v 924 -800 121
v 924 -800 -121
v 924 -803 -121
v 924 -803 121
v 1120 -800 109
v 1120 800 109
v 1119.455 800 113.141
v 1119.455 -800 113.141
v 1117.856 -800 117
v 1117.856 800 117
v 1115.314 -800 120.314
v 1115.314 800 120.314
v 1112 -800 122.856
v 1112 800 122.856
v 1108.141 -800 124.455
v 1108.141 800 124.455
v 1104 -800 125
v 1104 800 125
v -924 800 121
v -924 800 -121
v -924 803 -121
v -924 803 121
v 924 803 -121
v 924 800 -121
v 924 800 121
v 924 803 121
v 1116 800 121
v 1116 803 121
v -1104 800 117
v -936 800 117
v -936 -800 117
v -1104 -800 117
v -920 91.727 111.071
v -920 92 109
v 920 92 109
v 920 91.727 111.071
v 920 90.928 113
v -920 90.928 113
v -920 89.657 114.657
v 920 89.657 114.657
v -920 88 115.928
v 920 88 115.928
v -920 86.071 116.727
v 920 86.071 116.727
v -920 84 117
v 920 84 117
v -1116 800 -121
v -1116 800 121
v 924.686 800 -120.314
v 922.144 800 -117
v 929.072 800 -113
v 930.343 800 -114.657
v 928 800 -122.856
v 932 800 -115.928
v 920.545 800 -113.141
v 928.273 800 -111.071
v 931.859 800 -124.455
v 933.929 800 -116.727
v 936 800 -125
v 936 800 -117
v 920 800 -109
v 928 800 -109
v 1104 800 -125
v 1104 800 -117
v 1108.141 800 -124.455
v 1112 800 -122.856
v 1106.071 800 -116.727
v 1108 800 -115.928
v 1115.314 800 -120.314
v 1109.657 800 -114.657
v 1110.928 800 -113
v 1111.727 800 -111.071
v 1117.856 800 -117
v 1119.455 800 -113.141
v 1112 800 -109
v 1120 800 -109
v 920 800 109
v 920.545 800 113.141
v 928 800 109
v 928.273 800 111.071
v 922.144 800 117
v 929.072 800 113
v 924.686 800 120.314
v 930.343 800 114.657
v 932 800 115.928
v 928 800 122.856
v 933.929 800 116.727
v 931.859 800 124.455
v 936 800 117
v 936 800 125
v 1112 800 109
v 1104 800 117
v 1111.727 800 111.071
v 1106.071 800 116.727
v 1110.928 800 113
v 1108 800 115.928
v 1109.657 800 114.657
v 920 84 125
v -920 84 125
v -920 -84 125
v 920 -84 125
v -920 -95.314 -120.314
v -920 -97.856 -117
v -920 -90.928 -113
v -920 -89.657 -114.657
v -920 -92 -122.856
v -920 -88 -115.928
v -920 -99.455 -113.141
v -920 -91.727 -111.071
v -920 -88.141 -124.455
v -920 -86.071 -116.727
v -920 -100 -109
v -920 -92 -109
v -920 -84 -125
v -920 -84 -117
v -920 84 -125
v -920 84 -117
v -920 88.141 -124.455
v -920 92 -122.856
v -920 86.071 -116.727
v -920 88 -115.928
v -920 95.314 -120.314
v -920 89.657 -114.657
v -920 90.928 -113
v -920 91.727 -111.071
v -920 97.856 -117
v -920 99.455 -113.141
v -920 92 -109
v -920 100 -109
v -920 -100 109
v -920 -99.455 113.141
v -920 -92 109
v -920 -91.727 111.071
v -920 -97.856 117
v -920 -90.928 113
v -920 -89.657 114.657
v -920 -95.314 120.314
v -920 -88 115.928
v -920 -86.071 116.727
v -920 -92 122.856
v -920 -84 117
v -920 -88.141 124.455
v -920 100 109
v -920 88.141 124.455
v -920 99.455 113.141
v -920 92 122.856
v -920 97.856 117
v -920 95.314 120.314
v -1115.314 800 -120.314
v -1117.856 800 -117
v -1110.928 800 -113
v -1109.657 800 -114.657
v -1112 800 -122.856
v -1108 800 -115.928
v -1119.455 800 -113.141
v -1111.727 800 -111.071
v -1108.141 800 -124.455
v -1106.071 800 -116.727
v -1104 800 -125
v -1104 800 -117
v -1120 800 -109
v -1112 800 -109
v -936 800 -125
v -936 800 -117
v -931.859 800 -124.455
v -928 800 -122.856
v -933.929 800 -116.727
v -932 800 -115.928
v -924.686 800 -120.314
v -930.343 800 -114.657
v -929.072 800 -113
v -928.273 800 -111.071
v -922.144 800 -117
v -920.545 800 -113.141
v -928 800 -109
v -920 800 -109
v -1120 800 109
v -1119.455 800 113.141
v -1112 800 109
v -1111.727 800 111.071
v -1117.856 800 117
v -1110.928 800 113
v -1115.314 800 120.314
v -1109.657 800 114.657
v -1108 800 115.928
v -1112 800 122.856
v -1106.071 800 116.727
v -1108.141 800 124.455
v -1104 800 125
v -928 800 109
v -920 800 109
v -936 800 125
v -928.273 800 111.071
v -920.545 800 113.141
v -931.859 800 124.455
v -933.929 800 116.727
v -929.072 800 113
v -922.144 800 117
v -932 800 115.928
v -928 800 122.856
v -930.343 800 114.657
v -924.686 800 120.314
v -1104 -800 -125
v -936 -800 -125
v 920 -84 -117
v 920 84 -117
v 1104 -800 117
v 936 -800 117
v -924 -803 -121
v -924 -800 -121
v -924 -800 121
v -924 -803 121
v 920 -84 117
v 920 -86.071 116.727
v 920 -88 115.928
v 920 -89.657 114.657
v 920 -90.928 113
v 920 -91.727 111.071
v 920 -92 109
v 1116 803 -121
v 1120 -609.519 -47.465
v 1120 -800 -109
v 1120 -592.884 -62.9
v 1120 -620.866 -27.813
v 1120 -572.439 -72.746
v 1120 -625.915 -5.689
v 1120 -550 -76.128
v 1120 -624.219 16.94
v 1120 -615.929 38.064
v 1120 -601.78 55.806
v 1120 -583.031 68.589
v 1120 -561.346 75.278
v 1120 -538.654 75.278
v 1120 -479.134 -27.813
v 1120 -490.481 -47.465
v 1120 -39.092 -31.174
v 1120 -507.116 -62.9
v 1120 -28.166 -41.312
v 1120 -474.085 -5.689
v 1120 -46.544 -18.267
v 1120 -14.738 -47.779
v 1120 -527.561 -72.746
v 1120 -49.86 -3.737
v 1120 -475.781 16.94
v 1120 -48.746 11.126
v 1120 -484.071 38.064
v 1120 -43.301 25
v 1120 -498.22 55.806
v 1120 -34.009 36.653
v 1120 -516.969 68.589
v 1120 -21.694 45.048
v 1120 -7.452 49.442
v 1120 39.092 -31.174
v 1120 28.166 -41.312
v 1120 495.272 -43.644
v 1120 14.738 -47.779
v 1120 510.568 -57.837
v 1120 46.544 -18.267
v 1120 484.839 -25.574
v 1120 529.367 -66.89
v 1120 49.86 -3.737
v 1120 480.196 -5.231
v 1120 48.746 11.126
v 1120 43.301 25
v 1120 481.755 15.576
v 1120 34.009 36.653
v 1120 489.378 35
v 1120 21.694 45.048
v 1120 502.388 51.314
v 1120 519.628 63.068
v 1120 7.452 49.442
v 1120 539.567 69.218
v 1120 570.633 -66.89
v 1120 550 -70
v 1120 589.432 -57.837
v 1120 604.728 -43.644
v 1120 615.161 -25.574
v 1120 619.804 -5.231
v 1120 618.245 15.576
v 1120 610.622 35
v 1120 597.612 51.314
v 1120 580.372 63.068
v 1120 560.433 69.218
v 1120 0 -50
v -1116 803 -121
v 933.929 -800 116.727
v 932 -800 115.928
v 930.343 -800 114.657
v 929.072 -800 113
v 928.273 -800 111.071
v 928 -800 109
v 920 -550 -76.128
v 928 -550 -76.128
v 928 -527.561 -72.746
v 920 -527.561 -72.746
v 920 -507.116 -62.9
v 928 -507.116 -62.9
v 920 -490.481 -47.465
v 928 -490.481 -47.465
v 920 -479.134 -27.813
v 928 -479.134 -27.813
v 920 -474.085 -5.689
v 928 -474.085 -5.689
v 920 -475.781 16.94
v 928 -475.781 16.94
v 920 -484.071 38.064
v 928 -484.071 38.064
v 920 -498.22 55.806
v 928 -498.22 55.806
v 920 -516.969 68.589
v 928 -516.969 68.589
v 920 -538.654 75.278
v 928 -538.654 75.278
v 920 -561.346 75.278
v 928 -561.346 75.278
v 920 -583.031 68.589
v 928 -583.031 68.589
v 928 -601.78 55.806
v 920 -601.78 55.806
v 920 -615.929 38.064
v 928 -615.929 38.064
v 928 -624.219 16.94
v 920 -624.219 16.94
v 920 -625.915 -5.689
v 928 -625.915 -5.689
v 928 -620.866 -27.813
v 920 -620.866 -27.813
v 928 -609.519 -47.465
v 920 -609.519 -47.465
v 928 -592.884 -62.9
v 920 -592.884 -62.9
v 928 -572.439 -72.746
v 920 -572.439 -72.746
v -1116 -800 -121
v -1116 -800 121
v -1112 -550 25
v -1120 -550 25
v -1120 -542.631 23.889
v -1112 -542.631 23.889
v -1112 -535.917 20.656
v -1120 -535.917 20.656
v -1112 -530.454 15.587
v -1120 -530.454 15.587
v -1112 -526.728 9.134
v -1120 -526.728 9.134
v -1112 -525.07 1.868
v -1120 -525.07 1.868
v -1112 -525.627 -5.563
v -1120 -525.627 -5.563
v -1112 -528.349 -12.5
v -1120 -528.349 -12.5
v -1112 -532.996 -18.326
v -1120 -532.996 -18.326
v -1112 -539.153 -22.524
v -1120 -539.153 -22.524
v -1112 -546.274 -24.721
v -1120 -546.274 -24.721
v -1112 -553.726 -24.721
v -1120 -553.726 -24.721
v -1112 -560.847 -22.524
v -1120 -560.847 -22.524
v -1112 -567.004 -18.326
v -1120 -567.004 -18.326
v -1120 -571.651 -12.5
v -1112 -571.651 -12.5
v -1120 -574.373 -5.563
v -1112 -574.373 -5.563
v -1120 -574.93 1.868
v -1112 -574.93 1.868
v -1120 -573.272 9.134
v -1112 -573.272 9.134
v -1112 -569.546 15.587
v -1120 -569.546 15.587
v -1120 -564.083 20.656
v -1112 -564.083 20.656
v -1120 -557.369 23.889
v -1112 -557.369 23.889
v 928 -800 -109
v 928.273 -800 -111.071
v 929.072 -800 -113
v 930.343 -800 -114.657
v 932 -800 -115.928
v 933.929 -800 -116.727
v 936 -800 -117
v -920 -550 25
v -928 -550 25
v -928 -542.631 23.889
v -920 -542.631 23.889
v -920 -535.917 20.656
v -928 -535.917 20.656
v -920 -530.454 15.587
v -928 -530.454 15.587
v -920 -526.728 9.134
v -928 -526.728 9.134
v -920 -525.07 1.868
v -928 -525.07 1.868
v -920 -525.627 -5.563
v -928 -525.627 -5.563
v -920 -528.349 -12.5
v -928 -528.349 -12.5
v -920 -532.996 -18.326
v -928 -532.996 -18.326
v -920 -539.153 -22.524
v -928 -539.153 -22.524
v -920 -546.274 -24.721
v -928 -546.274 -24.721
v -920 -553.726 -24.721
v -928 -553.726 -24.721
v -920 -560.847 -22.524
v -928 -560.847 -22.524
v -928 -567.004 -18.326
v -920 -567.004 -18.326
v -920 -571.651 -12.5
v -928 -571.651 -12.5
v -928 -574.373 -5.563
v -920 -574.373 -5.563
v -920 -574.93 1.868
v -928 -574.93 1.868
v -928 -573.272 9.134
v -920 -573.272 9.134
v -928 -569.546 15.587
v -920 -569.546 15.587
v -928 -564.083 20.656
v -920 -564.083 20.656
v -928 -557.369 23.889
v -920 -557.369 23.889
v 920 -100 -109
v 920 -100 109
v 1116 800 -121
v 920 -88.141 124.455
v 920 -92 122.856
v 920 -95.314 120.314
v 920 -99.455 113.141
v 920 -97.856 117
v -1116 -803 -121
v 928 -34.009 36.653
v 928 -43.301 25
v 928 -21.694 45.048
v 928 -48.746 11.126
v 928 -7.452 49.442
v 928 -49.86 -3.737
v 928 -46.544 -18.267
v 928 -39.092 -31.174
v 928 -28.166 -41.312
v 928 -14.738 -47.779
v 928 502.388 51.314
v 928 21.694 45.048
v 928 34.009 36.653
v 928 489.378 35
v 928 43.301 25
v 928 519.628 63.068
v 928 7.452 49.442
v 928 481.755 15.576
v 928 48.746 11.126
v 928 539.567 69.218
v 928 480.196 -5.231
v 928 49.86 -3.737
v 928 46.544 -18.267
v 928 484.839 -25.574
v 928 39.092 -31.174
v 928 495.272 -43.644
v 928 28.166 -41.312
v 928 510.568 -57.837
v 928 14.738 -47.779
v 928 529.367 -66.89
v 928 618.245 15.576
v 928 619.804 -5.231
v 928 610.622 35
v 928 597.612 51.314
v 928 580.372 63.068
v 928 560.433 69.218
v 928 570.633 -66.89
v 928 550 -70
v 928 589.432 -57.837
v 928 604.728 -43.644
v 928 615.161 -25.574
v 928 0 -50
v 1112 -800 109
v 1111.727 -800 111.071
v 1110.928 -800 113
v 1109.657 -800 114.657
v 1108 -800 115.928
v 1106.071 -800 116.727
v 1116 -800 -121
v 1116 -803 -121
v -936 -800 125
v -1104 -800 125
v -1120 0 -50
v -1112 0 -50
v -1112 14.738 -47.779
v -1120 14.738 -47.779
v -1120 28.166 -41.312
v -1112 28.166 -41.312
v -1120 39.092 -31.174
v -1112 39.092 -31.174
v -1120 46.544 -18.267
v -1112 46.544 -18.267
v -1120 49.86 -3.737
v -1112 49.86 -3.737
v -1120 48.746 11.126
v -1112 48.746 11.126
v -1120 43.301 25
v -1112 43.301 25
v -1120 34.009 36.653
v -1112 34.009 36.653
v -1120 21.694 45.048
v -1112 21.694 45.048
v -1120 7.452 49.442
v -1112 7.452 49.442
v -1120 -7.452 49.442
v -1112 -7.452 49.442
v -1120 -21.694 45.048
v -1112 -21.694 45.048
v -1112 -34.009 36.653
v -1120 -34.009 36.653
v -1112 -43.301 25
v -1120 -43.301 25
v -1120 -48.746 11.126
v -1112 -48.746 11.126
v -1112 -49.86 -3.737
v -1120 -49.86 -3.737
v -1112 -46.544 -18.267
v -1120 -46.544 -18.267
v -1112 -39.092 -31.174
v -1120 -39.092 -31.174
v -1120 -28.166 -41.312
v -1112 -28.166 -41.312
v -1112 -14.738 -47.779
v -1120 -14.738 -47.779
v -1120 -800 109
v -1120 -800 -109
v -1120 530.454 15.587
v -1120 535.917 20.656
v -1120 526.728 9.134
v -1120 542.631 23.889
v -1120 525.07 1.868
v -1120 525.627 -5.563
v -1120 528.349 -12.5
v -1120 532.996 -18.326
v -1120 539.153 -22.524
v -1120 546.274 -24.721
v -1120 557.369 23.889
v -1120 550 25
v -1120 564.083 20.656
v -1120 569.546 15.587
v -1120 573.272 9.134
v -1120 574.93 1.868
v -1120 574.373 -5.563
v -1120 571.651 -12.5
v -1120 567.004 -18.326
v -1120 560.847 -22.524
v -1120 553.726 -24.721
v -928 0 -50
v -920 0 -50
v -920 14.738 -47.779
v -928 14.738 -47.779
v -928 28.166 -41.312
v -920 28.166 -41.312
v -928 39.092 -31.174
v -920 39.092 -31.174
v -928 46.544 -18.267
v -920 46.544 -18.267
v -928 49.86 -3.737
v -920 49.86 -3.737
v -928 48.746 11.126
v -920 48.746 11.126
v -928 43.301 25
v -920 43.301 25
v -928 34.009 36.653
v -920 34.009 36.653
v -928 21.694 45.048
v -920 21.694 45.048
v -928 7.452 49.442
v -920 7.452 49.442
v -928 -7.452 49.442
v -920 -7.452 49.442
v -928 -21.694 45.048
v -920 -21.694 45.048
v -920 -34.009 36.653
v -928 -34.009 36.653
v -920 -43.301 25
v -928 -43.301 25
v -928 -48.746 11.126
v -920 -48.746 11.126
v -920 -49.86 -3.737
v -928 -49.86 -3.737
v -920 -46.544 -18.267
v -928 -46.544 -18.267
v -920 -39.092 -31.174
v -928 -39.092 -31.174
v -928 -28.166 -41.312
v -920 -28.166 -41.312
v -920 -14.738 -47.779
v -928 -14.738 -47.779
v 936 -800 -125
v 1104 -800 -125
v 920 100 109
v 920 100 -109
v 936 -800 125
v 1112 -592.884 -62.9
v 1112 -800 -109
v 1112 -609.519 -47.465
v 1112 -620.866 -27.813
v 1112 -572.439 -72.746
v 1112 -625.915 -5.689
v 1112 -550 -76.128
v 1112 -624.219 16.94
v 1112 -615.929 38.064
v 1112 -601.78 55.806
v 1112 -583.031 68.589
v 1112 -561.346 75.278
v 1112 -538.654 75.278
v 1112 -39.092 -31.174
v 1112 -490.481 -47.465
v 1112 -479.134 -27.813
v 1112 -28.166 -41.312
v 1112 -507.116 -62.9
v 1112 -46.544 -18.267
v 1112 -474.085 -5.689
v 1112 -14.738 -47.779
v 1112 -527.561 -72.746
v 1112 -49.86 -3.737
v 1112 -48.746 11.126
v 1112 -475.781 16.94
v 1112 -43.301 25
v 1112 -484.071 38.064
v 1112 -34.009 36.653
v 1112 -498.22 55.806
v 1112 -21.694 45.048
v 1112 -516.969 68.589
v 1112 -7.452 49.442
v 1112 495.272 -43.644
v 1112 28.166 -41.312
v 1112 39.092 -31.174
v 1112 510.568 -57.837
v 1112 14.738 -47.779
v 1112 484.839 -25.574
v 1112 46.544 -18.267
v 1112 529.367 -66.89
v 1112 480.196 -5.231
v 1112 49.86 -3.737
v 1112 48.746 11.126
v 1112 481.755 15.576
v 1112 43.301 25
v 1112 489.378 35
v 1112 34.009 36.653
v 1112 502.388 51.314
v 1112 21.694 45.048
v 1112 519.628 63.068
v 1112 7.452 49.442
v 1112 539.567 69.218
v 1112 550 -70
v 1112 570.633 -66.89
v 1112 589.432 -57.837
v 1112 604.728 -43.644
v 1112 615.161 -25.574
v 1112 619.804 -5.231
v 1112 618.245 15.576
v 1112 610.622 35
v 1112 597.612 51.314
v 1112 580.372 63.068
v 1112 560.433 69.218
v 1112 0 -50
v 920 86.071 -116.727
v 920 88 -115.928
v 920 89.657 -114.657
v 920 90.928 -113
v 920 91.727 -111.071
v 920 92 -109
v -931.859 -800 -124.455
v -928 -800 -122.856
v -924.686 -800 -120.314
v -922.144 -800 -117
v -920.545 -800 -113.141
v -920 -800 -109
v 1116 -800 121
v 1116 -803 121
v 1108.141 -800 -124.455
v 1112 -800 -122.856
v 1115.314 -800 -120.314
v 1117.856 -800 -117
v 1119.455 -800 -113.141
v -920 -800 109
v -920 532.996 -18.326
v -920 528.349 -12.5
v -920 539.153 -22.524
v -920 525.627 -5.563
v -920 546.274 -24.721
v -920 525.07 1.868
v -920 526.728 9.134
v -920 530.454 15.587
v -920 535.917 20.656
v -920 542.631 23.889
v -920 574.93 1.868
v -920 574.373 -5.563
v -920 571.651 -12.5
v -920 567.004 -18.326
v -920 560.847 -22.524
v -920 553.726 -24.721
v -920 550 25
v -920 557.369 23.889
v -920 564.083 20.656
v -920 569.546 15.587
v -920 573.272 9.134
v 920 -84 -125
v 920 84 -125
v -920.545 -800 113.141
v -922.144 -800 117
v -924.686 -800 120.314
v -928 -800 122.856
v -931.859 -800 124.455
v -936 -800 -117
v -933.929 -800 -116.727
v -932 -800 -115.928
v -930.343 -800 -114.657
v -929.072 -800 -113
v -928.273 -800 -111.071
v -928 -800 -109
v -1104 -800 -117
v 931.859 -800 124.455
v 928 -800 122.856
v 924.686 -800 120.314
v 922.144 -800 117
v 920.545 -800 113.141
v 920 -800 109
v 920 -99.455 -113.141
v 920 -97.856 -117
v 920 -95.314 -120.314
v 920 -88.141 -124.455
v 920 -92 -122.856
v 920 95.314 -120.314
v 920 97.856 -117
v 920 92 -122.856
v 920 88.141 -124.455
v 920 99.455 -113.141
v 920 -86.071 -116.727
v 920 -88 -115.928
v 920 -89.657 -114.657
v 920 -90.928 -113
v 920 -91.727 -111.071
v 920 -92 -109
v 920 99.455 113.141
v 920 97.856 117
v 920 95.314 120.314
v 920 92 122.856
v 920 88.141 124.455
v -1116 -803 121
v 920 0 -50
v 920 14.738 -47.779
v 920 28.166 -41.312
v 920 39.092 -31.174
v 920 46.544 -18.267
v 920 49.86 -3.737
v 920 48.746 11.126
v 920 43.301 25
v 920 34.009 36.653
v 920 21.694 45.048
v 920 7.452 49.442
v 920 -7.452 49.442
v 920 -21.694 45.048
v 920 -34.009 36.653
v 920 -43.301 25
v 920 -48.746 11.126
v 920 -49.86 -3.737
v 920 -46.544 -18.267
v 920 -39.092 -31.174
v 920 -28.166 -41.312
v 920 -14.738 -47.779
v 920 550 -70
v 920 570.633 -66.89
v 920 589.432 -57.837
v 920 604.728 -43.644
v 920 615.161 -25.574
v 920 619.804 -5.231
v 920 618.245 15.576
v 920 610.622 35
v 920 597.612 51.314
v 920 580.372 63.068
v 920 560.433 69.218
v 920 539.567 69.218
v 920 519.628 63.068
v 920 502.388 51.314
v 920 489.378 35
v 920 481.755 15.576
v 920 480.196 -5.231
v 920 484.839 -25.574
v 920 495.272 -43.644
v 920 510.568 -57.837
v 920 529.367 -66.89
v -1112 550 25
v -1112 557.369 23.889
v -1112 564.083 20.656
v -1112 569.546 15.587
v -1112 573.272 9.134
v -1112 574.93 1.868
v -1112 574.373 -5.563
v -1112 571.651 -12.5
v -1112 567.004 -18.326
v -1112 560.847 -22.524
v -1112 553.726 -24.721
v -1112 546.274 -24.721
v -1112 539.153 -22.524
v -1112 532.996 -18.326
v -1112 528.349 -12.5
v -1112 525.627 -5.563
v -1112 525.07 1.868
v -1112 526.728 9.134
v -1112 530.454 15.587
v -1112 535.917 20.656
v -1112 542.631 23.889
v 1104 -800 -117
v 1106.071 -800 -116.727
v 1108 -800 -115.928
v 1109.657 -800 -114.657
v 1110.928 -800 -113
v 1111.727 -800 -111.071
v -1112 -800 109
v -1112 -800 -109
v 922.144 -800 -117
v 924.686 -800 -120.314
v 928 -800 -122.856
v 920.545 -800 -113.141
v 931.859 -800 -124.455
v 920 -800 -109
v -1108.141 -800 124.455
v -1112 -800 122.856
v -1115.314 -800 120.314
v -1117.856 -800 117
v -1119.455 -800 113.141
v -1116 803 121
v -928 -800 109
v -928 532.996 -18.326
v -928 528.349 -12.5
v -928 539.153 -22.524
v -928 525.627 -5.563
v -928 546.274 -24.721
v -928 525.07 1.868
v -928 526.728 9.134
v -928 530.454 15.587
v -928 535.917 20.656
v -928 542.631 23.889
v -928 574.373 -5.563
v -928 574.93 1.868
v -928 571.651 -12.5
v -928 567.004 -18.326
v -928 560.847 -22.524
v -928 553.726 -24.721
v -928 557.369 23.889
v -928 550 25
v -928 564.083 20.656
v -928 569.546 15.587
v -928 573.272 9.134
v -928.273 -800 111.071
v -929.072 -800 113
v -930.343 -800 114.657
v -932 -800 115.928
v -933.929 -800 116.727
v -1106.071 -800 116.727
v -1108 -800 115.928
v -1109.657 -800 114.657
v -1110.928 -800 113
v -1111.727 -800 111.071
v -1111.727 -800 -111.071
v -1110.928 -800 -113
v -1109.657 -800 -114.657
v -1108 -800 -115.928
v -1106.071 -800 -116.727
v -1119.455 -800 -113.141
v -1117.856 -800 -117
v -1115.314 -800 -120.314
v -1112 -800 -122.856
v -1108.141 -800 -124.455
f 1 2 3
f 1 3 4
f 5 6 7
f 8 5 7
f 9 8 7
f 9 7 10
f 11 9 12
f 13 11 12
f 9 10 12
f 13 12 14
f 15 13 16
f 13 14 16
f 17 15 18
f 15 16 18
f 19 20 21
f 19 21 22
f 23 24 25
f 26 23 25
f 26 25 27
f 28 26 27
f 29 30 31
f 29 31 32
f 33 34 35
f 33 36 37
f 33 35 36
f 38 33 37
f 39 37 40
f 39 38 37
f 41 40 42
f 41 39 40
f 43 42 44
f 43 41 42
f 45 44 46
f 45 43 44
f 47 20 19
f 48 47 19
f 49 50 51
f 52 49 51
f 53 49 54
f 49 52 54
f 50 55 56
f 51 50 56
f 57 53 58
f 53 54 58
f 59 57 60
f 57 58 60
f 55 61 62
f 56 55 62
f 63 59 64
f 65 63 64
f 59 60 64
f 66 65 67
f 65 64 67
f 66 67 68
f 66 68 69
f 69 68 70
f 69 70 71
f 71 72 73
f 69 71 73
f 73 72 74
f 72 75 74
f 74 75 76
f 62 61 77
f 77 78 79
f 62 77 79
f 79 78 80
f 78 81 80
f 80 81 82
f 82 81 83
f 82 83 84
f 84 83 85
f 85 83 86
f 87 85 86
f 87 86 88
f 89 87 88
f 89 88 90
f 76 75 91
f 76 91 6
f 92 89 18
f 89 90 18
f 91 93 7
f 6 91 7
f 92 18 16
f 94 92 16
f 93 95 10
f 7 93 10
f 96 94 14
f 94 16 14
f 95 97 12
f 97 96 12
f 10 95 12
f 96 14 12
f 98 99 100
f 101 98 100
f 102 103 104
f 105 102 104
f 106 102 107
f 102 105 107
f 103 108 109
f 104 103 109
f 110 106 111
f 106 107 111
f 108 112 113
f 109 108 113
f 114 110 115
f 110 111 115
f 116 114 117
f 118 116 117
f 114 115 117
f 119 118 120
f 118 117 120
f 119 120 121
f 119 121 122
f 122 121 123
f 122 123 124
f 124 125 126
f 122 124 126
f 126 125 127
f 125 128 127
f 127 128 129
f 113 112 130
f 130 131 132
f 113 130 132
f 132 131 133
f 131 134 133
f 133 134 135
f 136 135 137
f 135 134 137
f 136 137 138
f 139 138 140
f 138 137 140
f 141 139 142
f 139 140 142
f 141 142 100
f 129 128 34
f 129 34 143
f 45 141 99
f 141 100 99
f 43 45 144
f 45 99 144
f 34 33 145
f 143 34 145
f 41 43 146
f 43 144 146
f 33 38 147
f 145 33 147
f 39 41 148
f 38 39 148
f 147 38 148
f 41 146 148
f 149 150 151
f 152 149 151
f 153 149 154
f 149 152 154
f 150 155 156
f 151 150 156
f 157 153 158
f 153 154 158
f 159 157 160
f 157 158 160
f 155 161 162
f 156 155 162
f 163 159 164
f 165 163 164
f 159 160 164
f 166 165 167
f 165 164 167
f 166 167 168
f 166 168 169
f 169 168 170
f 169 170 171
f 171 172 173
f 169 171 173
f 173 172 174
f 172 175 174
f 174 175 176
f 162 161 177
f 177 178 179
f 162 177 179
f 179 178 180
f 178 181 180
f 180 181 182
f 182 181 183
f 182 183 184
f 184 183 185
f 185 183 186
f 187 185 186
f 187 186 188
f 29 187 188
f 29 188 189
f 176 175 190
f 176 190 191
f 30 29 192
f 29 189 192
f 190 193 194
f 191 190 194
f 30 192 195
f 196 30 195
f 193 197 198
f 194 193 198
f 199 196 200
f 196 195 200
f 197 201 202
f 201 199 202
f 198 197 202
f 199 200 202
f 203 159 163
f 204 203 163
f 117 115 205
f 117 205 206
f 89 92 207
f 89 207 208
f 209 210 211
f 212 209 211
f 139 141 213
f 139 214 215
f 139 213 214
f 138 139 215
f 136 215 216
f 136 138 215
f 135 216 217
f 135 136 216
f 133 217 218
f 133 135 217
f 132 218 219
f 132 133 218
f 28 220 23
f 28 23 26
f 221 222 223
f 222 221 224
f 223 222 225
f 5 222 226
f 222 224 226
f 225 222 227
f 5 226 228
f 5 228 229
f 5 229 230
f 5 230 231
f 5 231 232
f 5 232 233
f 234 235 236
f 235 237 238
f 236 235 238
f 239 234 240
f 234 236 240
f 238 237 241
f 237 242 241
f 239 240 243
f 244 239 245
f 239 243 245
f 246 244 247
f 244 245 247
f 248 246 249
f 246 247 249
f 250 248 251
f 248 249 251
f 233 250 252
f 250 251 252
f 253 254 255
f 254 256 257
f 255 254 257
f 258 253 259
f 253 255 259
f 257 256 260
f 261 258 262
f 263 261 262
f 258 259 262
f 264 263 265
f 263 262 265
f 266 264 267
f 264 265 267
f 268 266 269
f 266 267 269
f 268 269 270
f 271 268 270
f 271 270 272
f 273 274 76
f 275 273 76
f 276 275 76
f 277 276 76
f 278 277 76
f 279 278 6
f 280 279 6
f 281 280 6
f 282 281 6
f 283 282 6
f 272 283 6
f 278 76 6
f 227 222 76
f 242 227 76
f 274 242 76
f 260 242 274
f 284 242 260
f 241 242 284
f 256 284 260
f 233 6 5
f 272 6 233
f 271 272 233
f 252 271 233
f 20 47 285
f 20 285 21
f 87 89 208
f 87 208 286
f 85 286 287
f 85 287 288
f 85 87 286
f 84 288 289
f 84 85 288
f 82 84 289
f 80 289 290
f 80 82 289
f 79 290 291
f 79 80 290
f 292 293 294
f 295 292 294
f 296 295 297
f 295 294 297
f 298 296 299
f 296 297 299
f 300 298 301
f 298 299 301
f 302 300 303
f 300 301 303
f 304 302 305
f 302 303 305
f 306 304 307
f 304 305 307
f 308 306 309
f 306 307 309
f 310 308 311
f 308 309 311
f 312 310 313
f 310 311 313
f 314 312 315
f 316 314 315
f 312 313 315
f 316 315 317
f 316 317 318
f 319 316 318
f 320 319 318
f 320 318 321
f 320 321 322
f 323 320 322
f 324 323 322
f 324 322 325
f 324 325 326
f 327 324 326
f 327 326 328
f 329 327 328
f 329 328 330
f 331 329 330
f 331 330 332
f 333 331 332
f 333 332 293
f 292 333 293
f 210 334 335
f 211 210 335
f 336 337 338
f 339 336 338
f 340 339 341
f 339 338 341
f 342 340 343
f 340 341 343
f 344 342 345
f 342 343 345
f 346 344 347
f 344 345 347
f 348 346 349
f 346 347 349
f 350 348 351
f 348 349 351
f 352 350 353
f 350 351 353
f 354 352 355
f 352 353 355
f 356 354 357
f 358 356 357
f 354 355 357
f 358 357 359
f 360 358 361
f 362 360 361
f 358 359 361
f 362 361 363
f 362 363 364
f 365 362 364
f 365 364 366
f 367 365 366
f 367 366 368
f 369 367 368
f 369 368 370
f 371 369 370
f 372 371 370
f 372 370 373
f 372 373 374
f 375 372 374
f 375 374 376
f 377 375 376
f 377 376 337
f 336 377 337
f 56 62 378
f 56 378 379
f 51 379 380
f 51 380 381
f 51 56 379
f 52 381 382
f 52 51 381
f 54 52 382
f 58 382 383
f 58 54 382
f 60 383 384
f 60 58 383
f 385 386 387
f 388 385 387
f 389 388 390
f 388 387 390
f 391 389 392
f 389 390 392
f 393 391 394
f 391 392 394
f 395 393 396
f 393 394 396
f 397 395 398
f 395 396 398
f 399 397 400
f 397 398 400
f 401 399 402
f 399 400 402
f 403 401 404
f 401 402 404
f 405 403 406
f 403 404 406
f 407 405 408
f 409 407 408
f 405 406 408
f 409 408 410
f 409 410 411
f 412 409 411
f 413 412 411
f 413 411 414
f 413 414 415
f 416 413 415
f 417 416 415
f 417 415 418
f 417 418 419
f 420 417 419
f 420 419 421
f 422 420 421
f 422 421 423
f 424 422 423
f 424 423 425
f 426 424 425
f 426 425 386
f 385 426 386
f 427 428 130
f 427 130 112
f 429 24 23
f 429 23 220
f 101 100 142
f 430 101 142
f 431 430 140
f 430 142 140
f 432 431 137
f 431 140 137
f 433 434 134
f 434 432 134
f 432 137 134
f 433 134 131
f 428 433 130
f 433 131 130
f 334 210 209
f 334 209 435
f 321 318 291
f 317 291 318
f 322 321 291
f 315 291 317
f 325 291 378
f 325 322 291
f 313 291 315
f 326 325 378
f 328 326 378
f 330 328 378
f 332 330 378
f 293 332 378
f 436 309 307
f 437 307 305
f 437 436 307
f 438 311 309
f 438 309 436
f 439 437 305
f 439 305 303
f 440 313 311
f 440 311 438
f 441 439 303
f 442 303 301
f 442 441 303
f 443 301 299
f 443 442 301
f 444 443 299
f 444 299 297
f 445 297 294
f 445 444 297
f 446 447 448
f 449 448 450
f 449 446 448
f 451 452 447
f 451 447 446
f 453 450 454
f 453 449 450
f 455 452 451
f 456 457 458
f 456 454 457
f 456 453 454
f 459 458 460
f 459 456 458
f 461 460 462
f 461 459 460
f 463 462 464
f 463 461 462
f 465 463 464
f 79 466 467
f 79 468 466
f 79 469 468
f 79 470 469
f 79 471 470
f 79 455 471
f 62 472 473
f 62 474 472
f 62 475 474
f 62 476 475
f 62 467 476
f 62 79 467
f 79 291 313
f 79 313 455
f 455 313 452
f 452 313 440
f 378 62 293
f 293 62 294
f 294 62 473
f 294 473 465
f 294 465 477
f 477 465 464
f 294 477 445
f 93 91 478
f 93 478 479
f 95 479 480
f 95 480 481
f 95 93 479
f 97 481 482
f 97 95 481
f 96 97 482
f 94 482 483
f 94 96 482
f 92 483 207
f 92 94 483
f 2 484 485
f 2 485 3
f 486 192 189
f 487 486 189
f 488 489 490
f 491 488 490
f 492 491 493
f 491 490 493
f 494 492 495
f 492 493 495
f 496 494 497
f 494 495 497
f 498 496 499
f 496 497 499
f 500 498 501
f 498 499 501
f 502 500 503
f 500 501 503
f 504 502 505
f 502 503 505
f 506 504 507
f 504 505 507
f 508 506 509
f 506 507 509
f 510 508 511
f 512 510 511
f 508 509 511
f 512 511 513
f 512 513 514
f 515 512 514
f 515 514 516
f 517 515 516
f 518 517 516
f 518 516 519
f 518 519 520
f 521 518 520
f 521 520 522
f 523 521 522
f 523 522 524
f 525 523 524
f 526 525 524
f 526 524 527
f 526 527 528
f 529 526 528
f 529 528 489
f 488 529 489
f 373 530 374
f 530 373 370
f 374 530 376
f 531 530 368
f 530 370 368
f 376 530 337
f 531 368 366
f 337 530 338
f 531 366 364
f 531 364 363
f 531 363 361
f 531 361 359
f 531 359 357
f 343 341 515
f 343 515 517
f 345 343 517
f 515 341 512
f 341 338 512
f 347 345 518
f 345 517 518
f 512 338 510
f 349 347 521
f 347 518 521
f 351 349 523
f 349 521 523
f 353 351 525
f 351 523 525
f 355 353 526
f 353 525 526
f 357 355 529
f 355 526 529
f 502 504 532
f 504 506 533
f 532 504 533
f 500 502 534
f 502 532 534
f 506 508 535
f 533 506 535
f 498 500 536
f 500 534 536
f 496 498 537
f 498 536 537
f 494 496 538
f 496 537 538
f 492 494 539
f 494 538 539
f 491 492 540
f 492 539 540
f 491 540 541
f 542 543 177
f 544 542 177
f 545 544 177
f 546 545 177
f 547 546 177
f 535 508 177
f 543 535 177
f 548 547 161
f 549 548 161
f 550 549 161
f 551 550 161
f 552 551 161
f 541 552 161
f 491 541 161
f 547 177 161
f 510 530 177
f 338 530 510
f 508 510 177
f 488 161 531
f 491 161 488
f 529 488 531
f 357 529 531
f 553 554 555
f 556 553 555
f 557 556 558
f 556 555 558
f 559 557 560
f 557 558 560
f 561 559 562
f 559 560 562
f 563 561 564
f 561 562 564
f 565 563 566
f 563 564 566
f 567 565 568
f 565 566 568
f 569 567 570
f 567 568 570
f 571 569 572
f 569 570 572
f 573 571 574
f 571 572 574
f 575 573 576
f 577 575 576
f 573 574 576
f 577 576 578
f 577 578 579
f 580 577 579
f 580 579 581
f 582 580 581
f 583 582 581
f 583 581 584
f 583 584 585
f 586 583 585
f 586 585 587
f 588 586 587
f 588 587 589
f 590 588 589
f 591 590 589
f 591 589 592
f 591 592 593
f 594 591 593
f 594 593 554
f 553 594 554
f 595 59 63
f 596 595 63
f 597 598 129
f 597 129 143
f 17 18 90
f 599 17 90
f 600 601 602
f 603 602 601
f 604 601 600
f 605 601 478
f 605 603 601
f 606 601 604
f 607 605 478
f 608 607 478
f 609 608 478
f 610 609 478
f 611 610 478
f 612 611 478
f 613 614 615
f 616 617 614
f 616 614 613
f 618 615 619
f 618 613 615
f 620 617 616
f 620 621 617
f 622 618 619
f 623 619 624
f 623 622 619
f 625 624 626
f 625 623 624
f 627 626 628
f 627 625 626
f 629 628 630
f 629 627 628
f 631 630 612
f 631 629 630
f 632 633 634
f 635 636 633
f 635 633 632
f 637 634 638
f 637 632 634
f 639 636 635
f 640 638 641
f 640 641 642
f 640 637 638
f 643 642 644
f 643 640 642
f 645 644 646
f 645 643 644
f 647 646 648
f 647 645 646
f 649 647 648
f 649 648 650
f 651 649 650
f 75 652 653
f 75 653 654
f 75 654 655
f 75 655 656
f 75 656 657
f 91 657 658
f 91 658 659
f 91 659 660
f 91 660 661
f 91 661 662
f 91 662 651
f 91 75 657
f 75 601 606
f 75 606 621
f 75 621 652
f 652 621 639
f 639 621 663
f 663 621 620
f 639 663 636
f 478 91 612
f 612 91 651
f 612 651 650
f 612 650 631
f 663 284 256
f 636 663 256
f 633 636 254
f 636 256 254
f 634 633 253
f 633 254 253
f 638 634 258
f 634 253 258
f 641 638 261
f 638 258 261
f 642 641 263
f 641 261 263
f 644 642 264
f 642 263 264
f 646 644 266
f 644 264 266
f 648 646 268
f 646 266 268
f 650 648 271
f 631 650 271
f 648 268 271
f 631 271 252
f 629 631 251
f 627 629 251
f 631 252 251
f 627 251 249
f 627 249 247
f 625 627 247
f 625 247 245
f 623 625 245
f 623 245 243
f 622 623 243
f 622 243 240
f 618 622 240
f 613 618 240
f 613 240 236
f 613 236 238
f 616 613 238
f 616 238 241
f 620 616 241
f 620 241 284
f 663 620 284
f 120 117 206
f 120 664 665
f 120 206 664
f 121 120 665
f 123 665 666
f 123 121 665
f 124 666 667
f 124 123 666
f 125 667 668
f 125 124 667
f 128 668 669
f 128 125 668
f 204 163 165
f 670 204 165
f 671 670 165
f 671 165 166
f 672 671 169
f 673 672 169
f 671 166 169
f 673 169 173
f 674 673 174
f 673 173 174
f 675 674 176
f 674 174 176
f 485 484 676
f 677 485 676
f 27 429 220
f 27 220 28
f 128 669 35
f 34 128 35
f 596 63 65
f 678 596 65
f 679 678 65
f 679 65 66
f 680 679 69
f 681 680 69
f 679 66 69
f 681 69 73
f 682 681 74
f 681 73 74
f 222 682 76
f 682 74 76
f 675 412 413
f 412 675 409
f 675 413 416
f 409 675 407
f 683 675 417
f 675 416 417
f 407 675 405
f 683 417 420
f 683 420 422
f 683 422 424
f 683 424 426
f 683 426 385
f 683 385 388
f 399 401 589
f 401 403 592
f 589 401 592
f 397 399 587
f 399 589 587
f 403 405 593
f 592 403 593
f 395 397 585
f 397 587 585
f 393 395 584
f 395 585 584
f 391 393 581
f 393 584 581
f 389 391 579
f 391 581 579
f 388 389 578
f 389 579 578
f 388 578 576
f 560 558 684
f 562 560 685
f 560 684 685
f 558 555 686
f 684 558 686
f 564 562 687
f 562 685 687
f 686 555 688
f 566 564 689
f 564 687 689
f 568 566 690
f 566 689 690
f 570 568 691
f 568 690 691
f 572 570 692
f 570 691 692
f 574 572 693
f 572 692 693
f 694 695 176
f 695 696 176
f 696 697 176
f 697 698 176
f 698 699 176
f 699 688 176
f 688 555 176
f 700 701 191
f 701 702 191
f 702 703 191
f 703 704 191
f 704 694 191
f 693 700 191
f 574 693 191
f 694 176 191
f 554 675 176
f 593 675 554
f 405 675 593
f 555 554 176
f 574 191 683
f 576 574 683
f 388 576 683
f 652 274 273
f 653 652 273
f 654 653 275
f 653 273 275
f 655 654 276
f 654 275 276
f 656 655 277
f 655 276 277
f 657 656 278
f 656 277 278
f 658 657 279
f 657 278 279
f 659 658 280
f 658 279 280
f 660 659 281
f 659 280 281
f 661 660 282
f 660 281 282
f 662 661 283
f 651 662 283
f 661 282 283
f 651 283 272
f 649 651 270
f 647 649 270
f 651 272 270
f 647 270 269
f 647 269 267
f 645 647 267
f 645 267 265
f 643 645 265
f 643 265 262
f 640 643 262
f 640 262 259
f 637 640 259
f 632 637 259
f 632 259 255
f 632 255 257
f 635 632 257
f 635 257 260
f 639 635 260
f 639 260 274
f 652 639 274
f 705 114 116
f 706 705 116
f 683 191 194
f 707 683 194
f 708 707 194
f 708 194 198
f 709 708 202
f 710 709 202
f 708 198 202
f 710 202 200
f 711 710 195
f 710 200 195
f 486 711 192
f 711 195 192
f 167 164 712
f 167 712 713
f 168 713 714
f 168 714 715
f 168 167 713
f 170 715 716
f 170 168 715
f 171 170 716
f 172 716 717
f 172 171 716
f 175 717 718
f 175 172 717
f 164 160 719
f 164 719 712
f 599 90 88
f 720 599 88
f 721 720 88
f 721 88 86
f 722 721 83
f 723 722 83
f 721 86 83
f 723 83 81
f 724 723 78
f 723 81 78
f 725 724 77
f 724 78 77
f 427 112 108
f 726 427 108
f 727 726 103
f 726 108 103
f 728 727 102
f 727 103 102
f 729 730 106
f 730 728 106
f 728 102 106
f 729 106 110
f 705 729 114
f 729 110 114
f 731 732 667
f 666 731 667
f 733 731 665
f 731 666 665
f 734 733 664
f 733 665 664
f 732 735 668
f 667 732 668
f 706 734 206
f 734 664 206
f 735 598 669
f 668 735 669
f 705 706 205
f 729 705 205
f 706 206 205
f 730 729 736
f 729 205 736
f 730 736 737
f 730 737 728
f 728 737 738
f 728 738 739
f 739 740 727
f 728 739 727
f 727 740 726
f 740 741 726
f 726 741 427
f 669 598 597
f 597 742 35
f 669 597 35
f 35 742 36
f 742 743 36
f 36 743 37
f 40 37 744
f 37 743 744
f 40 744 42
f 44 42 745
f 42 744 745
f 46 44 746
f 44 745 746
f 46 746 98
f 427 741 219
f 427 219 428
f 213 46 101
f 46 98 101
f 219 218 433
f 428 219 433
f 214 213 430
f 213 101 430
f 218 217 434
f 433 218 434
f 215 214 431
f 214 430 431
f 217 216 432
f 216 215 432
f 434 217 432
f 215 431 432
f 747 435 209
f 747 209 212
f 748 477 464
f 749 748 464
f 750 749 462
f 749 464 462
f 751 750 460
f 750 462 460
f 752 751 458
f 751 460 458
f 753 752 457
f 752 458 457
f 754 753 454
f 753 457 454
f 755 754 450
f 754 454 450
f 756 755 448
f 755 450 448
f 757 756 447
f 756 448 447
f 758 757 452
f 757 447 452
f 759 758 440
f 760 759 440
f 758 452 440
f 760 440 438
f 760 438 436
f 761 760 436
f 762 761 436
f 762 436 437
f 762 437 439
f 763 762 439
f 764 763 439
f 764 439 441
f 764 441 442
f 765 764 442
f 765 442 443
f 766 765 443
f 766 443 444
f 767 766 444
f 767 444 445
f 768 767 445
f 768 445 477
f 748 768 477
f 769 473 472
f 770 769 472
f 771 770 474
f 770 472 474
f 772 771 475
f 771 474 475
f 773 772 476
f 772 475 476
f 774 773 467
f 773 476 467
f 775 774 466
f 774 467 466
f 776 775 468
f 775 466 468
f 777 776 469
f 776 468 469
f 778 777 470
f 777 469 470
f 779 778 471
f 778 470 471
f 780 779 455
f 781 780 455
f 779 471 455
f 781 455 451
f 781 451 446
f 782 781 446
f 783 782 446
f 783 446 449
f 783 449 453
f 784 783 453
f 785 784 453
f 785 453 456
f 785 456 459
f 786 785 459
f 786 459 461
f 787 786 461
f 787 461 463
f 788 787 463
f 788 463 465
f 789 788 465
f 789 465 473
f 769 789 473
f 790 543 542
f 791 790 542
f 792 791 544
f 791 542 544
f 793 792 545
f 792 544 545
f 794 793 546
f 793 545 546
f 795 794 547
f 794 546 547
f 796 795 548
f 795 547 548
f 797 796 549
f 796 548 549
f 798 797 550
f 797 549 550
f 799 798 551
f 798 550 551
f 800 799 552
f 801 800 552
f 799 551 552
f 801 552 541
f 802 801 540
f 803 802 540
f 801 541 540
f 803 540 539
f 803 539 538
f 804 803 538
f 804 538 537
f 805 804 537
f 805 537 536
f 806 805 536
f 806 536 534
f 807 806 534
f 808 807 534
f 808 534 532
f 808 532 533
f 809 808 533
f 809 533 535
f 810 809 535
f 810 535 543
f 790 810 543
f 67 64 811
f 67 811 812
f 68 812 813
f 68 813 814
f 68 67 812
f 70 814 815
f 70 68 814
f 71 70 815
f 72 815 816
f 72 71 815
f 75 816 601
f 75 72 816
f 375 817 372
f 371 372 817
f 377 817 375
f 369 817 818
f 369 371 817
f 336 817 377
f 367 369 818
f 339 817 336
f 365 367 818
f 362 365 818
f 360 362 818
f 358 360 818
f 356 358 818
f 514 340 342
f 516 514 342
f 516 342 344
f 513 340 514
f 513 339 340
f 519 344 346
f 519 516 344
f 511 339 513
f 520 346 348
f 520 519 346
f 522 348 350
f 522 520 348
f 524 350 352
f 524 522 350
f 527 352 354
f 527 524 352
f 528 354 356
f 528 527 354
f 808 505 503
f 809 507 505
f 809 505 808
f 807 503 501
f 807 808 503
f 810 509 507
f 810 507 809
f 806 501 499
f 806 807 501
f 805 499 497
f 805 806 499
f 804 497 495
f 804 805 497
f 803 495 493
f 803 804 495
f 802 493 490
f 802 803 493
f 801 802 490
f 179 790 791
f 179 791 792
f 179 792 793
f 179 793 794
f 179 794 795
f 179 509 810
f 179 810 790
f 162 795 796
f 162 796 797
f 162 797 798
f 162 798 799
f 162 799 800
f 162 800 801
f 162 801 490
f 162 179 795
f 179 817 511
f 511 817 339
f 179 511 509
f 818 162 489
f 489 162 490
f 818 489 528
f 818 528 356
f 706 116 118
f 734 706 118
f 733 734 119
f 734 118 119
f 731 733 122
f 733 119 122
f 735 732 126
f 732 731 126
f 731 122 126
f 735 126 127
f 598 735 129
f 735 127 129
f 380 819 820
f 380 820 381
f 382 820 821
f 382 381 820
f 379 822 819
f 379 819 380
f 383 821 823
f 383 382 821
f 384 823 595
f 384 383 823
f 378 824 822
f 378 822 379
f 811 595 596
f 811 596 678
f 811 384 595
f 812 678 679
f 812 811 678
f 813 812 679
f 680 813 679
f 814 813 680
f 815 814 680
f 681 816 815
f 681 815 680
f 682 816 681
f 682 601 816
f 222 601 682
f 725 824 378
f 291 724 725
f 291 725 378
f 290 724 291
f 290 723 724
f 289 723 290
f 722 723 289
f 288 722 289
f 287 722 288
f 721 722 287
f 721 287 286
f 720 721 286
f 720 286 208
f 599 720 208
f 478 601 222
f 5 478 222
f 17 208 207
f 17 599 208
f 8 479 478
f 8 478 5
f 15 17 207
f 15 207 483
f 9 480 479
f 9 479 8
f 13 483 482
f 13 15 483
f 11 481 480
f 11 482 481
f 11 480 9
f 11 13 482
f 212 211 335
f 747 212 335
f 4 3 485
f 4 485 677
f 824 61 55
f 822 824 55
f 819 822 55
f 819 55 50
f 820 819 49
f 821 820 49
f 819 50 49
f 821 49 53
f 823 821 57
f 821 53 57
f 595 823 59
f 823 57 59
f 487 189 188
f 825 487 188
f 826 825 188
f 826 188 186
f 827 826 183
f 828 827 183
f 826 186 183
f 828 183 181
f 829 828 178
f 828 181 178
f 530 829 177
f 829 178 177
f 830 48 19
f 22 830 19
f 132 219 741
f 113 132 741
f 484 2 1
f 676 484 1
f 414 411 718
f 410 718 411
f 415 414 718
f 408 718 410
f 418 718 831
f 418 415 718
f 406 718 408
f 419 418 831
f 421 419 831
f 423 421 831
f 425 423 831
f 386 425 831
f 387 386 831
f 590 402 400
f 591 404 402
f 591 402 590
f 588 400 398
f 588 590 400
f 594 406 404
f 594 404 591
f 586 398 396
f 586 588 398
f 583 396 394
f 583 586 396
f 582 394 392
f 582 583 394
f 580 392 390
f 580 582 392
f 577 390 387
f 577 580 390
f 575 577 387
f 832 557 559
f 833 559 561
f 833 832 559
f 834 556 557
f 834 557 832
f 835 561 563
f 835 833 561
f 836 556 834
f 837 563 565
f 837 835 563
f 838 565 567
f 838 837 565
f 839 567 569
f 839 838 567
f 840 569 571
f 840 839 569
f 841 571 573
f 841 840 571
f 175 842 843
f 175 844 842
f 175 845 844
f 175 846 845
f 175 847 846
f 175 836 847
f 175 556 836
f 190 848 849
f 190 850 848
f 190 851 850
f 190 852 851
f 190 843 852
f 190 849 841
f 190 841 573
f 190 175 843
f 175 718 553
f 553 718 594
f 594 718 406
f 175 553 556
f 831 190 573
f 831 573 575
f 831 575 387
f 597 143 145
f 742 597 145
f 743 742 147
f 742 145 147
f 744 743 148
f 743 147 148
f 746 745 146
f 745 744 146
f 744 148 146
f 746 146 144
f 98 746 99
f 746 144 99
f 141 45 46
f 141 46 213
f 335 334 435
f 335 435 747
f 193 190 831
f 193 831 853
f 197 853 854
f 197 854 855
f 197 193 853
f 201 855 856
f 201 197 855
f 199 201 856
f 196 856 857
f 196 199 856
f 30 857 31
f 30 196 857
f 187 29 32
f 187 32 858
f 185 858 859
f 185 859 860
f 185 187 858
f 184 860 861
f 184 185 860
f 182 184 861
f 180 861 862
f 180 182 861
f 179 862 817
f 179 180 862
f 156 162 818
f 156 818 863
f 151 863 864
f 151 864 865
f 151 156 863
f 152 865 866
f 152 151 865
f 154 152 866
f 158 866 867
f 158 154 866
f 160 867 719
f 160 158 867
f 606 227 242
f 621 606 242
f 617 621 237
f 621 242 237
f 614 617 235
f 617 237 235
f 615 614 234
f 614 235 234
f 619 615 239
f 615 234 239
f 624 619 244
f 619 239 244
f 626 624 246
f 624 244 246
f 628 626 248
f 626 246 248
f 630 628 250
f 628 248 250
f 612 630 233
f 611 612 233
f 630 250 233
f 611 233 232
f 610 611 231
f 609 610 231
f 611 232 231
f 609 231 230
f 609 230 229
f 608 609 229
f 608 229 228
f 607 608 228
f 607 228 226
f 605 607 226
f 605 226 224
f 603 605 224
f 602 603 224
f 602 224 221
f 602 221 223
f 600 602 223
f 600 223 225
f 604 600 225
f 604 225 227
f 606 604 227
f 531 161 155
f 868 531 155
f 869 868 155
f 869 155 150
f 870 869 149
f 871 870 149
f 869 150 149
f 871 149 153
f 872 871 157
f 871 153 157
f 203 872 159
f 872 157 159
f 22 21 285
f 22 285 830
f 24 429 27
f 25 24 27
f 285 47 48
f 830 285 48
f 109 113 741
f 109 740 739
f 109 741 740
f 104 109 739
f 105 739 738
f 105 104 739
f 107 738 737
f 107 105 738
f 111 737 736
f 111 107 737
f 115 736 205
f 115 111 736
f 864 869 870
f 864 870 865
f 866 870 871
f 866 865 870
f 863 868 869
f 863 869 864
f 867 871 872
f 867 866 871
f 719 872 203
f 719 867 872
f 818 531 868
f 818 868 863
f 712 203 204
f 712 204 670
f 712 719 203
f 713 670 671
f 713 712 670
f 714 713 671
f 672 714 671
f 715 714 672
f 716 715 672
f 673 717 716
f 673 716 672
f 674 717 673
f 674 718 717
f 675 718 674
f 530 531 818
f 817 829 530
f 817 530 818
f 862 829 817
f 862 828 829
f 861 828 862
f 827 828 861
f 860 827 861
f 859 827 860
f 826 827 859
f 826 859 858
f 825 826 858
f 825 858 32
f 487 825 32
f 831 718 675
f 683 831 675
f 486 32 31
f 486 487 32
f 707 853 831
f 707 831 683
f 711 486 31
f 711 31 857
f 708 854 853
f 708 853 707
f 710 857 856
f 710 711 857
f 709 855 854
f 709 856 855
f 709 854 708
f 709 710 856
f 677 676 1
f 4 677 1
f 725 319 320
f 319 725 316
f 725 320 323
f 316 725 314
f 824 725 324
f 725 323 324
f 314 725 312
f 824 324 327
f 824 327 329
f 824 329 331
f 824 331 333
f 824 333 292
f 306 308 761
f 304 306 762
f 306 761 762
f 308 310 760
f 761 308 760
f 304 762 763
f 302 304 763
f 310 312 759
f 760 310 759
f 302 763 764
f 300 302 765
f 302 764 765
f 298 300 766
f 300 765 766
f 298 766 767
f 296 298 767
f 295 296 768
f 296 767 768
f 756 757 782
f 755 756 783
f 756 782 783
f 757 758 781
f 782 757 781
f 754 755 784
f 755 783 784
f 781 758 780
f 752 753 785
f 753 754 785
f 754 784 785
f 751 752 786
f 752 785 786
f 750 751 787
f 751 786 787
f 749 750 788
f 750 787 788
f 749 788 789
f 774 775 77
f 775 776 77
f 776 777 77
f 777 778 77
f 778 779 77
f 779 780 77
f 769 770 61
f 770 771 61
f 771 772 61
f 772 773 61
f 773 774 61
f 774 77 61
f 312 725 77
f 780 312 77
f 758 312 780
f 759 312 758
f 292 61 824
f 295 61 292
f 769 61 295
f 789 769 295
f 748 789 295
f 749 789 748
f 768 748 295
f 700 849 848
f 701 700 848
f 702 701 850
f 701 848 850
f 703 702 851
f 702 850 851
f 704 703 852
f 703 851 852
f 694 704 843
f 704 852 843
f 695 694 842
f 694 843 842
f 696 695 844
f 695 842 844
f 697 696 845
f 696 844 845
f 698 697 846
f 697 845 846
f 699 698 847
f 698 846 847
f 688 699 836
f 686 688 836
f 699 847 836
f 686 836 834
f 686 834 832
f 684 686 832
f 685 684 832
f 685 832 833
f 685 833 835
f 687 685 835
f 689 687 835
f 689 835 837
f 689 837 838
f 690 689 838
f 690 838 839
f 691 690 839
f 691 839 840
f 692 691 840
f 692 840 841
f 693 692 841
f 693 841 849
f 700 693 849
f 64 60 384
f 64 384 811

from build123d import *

# Parameters (mm, degrees)
MEMBER_1_DEPTH         = 1600
MEMBER_1_2_DEPTH       = 1600
MEMBER_2_DEPTH         = 2040
CUT_EXTRUDE_1_REACH    = 2383.853
SKETCH_2_R             = 70
SKETCH_2_R_2           = 76.128040806
SKETCH_3_R             = 50
CUT_EXTRUDE_2_DEPTH    = 2382.85327004
END_CAP_1_WIDTH        = 242
END_CAP_1_HEIGHT       = 192
END_CAP_1_THICKNESS    = 3
END_CAP_1_4_WIDTH      = 242
END_CAP_1_4_HEIGHT     = 192
END_CAP_1_4_THICKNESS  = 3
END_CAP_1_7_WIDTH      = 242
END_CAP_1_7_HEIGHT     = 192
END_CAP_1_7_THICKNESS  = 3
END_CAP_1_10_WIDTH     = 242
END_CAP_1_10_HEIGHT    = 192
END_CAP_1_10_THICKNESS = 3
CUT_EXTRUDE_3_REACH    = 2384.863
SKETCH_5_R             = 25


with BuildPart() as part:
    # Sketch1 → Member 1 (new body)
    with BuildSketch(Plane(origin=(-1020, 800, 0), x_dir=(1, 0, 0), z_dir=(0, -1, 0))):
        with BuildLine():
            Line((-84, -125), (84, -125))
            ThreePointArc((84, -125), (95.313708499, -120.313708499), (100, -109))
            Line((100, -109), (100, 109))
            ThreePointArc((100, 109), (95.313708499, 120.313708499), (84, 125))
            Line((84, 125), (-84, 125))
            ThreePointArc((-84, 125), (-95.313708499, 120.313708499), (-100, 109))
            Line((-100, 109), (-100, -109))
            ThreePointArc((-100, -109), (-95.313708499, -120.313708499), (-84, -125))
        make_face()
        with BuildLine():
            Line((-84, -117), (84, -117))
            ThreePointArc((84, -117), (89.656854249, -114.656854249), (92, -109))
            Line((92, -109), (92, 109))
            ThreePointArc((92, 109), (89.656854249, 114.656854249), (84, 117))
            Line((84, 117), (-84, 117))
            ThreePointArc((-84, 117), (-89.656854249, 114.656854249), (-92, 109))
            Line((-92, 109), (-92, -109))
            ThreePointArc((-92, -109), (-89.656854249, -114.656854249), (-84, -117))
        make_face(mode=Mode.SUBTRACT)
    extrude(amount=MEMBER_1_DEPTH)


with BuildPart() as body_2:
    # Sketch1 on segment 2 (carried to segment 2) → Member 1 2 (new body)
    with BuildSketch(Plane(origin=(1020, 800, 0), x_dir=(1, 0, 0), z_dir=(0, -1, 0))):
        with BuildLine():
            Line((-84, -125), (84, -125))
            ThreePointArc((84, -125), (95.313708499, -120.313708499), (100, -109))
            Line((100, -109), (100, 109))
            ThreePointArc((100, 109), (95.313708499, 120.313708499), (84, 125))
            Line((84, 125), (-84, 125))
            ThreePointArc((-84, 125), (-95.313708499, 120.313708499), (-100, 109))
            Line((-100, 109), (-100, -109))
            ThreePointArc((-100, -109), (-95.313708499, -120.313708499), (-84, -125))
        make_face()
        with BuildLine():
            Line((-84, -117), (84, -117))
            ThreePointArc((84, -117), (89.656854249, -114.656854249), (92, -109))
            Line((92, -109), (92, 109))
            ThreePointArc((92, 109), (89.656854249, 114.656854249), (84, 117))
            Line((84, 117), (-84, 117))
            ThreePointArc((-84, 117), (-89.656854249, 114.656854249), (-92, 109))
            Line((-92, 109), (-92, -109))
            ThreePointArc((-92, -109), (-89.656854249, -114.656854249), (-84, -117))
        make_face(mode=Mode.SUBTRACT)
    extrude(amount=MEMBER_1_2_DEPTH)

    # 切除-拉伸1: up to this face of the body (flat: up to its plane)
    cut_extrude_1_end = Plane(body_2.part.faces().sort_by_distance((920, 0, 0))[0])
    # 草图2 → 切除-拉伸1 (cut, up to the picked face)
    with BuildSketch(Plane(origin=(1120, 0, 0), x_dir=(0, 0, -1), z_dir=(1, 0, 0)), mode=Mode.PRIVATE) as cut_extrude_1_sk1:
        with Locations((0, 550)):
            Circle(SKETCH_2_R)
    cut_extrude_1_tool1 = split(extrude(cut_extrude_1_sk1.sketch, amount=-CUT_EXTRUDE_1_REACH, mode=Mode.PRIVATE), bisect_by=cut_extrude_1_end, keep=Keep.BOTH, mode=Mode.PRIVATE)
    # 草图2 → 切除-拉伸1 (cut, up to the picked face)
    with BuildSketch(Plane(origin=(1120, 0, 0), x_dir=(0, 0, -1), z_dir=(1, 0, 0)), mode=Mode.PRIVATE) as cut_extrude_1_sk2:
        with Locations((0, -550)):
            Circle(SKETCH_2_R_2)
    cut_extrude_1_tool2 = split(extrude(cut_extrude_1_sk2.sketch, amount=-CUT_EXTRUDE_1_REACH, mode=Mode.PRIVATE), bisect_by=cut_extrude_1_end, keep=Keep.BOTH, mode=Mode.PRIVATE)
    add(cut_extrude_1_tool1.solids().sort_by(Axis((1120, 550, 0), (-1, 0, 0)))[0], mode=Mode.SUBTRACT)
    add(cut_extrude_1_tool2.solids().sort_by(Axis((1120, -550, 0), (-1, 0, 0)))[0], mode=Mode.SUBTRACT)


with BuildPart() as body_3:
    # Sketch11 → Member 2 (new body)
    with BuildSketch(Plane.YZ.offset(-1020)):
        with BuildLine():
            Line((-84, -125), (84, -125))
            ThreePointArc((84, -125), (95.313708499, -120.313708499), (100, -109))
            Line((100, -109), (100, 109))
            ThreePointArc((100, 109), (95.313708499, 120.313708499), (84, 125))
            Line((84, 125), (-84, 125))
            ThreePointArc((-84, 125), (-95.313708499, 120.313708499), (-100, 109))
            Line((-100, 109), (-100, -109))
            ThreePointArc((-100, -109), (-95.313708499, -120.313708499), (-84, -125))
        make_face()
        with BuildLine():
            Line((-84, -117), (84, -117))
            ThreePointArc((84, -117), (89.656854249, -114.656854249), (92, -109))
            Line((92, -109), (92, 109))
            ThreePointArc((92, 109), (89.656854249, 114.656854249), (84, 117))
            Line((84, 117), (-84, 117))
            ThreePointArc((-84, 117), (-89.656854249, 114.656854249), (-92, 109))
            Line((-92, 109), (-92, -109))
            ThreePointArc((-92, -109), (-89.656854249, -114.656854249), (-84, -117))
        make_face(mode=Mode.SUBTRACT)
    extrude(amount=MEMBER_2_DEPTH)

    # Weld Trim 1 41
    split(bisect_by=Plane.YZ.offset(-920), keep=Keep.TOP)

    # Weld Trim 1 48
    split(bisect_by=Plane(origin=(920, 0, 0), x_dir=(0, -1, 0), z_dir=(-1, 0, 0)), keep=Keep.TOP)


with BuildPart() as cut_extrude_2_tool:
    # 草图3 → 切除-拉伸2 (new, through all)
    with BuildSketch(Plane(origin=(1120, 0, 0), x_dir=(0, 0, -1), z_dir=(1, 0, 0))):
        Circle(SKETCH_3_R)
    extrude(amount=-CUT_EXTRUDE_2_DEPTH)


with BuildPart() as part_1:
    add(part.part)

    # 切除-拉伸2: cut by cut_extrude_2_tool
    add(cut_extrude_2_tool.part, mode=Mode.SUBTRACT)

    # 切除-拉伸3: up to this face of the body (flat: up to its plane)
    cut_extrude_3_end = Plane(part_1.part.faces().sort_by_distance((-920, 0, -92.852170424))[0])
    # 草图5 → 切除-拉伸3 (cut, up to the picked face)
    with BuildSketch(Plane.ZY.offset(1120), mode=Mode.PRIVATE) as cut_extrude_3_sk1:
        with Locations((0, 550)):
            Circle(SKETCH_5_R)
    cut_extrude_3_tool1 = split(extrude(cut_extrude_3_sk1.sketch, amount=-CUT_EXTRUDE_3_REACH, mode=Mode.PRIVATE), bisect_by=cut_extrude_3_end, keep=Keep.BOTH, mode=Mode.PRIVATE)
    # 草图5 → 切除-拉伸3 (cut, up to the picked face)
    with BuildSketch(Plane.ZY.offset(1120), mode=Mode.PRIVATE) as cut_extrude_3_sk2:
        with Locations((0, -550)):
            Circle(SKETCH_5_R)
    cut_extrude_3_tool2 = split(extrude(cut_extrude_3_sk2.sketch, amount=-CUT_EXTRUDE_3_REACH, mode=Mode.PRIVATE), bisect_by=cut_extrude_3_end, keep=Keep.BOTH, mode=Mode.PRIVATE)
    add(cut_extrude_3_tool1.solids().sort_by(Axis((-1120, 550, 0), (1, 0, 0)))[0], mode=Mode.SUBTRACT)
    add(cut_extrude_3_tool2.solids().sort_by(Axis((-1120, -550, 0), (1, 0, 0)))[0], mode=Mode.SUBTRACT)


with BuildPart() as body_2_1:
    add(body_2.part)

    # 切除-拉伸2: cut by cut_extrude_2_tool
    add(cut_extrude_2_tool.part, mode=Mode.SUBTRACT)


with BuildPart() as body_4:
    # End Cap 1: an end cap: a rectangular plate 3.0 thick over the member's open end
    with BuildSketch(Plane(origin=(1020, 800, 0), x_dir=(0, 0, 1), z_dir=(0, 1, 0))):
        Rectangle(END_CAP_1_WIDTH, END_CAP_1_HEIGHT)
    extrude(amount=END_CAP_1_THICKNESS)


with BuildPart() as body_5:
    # End Cap 1 4: an end cap: a rectangular plate 3.0 thick over the member's open end
    with BuildSketch(Plane(origin=(-1020, 800, 0), x_dir=(0, 0, 1), z_dir=(0, 1, 0))):
        Rectangle(END_CAP_1_4_WIDTH, END_CAP_1_4_HEIGHT)
    extrude(amount=END_CAP_1_4_THICKNESS)


with BuildPart() as body_6:
    # End Cap 1 7: an end cap: a rectangular plate 3.0 thick over the member's open end
    with BuildSketch(Plane(origin=(1020, -800, 0), x_dir=(0, 0, 1), z_dir=(0, -1, 0))):
        Rectangle(END_CAP_1_7_WIDTH, END_CAP_1_7_HEIGHT)
    extrude(amount=END_CAP_1_7_THICKNESS)


with BuildPart() as body_7:
    # End Cap 1 10: an end cap: a rectangular plate 3.0 thick over the member's open end
    with BuildSketch(Plane(origin=(-1020, -800, 0), x_dir=(0, 0, 1), z_dir=(0, -1, 0))):
        Rectangle(END_CAP_1_10_WIDTH, END_CAP_1_10_HEIGHT)
    extrude(amount=END_CAP_1_10_THICKNESS)


solid = Compound([body_3.part, part_1.part, body_2_1.part, body_4.part, body_5.part, body_6.part, body_7.part])
